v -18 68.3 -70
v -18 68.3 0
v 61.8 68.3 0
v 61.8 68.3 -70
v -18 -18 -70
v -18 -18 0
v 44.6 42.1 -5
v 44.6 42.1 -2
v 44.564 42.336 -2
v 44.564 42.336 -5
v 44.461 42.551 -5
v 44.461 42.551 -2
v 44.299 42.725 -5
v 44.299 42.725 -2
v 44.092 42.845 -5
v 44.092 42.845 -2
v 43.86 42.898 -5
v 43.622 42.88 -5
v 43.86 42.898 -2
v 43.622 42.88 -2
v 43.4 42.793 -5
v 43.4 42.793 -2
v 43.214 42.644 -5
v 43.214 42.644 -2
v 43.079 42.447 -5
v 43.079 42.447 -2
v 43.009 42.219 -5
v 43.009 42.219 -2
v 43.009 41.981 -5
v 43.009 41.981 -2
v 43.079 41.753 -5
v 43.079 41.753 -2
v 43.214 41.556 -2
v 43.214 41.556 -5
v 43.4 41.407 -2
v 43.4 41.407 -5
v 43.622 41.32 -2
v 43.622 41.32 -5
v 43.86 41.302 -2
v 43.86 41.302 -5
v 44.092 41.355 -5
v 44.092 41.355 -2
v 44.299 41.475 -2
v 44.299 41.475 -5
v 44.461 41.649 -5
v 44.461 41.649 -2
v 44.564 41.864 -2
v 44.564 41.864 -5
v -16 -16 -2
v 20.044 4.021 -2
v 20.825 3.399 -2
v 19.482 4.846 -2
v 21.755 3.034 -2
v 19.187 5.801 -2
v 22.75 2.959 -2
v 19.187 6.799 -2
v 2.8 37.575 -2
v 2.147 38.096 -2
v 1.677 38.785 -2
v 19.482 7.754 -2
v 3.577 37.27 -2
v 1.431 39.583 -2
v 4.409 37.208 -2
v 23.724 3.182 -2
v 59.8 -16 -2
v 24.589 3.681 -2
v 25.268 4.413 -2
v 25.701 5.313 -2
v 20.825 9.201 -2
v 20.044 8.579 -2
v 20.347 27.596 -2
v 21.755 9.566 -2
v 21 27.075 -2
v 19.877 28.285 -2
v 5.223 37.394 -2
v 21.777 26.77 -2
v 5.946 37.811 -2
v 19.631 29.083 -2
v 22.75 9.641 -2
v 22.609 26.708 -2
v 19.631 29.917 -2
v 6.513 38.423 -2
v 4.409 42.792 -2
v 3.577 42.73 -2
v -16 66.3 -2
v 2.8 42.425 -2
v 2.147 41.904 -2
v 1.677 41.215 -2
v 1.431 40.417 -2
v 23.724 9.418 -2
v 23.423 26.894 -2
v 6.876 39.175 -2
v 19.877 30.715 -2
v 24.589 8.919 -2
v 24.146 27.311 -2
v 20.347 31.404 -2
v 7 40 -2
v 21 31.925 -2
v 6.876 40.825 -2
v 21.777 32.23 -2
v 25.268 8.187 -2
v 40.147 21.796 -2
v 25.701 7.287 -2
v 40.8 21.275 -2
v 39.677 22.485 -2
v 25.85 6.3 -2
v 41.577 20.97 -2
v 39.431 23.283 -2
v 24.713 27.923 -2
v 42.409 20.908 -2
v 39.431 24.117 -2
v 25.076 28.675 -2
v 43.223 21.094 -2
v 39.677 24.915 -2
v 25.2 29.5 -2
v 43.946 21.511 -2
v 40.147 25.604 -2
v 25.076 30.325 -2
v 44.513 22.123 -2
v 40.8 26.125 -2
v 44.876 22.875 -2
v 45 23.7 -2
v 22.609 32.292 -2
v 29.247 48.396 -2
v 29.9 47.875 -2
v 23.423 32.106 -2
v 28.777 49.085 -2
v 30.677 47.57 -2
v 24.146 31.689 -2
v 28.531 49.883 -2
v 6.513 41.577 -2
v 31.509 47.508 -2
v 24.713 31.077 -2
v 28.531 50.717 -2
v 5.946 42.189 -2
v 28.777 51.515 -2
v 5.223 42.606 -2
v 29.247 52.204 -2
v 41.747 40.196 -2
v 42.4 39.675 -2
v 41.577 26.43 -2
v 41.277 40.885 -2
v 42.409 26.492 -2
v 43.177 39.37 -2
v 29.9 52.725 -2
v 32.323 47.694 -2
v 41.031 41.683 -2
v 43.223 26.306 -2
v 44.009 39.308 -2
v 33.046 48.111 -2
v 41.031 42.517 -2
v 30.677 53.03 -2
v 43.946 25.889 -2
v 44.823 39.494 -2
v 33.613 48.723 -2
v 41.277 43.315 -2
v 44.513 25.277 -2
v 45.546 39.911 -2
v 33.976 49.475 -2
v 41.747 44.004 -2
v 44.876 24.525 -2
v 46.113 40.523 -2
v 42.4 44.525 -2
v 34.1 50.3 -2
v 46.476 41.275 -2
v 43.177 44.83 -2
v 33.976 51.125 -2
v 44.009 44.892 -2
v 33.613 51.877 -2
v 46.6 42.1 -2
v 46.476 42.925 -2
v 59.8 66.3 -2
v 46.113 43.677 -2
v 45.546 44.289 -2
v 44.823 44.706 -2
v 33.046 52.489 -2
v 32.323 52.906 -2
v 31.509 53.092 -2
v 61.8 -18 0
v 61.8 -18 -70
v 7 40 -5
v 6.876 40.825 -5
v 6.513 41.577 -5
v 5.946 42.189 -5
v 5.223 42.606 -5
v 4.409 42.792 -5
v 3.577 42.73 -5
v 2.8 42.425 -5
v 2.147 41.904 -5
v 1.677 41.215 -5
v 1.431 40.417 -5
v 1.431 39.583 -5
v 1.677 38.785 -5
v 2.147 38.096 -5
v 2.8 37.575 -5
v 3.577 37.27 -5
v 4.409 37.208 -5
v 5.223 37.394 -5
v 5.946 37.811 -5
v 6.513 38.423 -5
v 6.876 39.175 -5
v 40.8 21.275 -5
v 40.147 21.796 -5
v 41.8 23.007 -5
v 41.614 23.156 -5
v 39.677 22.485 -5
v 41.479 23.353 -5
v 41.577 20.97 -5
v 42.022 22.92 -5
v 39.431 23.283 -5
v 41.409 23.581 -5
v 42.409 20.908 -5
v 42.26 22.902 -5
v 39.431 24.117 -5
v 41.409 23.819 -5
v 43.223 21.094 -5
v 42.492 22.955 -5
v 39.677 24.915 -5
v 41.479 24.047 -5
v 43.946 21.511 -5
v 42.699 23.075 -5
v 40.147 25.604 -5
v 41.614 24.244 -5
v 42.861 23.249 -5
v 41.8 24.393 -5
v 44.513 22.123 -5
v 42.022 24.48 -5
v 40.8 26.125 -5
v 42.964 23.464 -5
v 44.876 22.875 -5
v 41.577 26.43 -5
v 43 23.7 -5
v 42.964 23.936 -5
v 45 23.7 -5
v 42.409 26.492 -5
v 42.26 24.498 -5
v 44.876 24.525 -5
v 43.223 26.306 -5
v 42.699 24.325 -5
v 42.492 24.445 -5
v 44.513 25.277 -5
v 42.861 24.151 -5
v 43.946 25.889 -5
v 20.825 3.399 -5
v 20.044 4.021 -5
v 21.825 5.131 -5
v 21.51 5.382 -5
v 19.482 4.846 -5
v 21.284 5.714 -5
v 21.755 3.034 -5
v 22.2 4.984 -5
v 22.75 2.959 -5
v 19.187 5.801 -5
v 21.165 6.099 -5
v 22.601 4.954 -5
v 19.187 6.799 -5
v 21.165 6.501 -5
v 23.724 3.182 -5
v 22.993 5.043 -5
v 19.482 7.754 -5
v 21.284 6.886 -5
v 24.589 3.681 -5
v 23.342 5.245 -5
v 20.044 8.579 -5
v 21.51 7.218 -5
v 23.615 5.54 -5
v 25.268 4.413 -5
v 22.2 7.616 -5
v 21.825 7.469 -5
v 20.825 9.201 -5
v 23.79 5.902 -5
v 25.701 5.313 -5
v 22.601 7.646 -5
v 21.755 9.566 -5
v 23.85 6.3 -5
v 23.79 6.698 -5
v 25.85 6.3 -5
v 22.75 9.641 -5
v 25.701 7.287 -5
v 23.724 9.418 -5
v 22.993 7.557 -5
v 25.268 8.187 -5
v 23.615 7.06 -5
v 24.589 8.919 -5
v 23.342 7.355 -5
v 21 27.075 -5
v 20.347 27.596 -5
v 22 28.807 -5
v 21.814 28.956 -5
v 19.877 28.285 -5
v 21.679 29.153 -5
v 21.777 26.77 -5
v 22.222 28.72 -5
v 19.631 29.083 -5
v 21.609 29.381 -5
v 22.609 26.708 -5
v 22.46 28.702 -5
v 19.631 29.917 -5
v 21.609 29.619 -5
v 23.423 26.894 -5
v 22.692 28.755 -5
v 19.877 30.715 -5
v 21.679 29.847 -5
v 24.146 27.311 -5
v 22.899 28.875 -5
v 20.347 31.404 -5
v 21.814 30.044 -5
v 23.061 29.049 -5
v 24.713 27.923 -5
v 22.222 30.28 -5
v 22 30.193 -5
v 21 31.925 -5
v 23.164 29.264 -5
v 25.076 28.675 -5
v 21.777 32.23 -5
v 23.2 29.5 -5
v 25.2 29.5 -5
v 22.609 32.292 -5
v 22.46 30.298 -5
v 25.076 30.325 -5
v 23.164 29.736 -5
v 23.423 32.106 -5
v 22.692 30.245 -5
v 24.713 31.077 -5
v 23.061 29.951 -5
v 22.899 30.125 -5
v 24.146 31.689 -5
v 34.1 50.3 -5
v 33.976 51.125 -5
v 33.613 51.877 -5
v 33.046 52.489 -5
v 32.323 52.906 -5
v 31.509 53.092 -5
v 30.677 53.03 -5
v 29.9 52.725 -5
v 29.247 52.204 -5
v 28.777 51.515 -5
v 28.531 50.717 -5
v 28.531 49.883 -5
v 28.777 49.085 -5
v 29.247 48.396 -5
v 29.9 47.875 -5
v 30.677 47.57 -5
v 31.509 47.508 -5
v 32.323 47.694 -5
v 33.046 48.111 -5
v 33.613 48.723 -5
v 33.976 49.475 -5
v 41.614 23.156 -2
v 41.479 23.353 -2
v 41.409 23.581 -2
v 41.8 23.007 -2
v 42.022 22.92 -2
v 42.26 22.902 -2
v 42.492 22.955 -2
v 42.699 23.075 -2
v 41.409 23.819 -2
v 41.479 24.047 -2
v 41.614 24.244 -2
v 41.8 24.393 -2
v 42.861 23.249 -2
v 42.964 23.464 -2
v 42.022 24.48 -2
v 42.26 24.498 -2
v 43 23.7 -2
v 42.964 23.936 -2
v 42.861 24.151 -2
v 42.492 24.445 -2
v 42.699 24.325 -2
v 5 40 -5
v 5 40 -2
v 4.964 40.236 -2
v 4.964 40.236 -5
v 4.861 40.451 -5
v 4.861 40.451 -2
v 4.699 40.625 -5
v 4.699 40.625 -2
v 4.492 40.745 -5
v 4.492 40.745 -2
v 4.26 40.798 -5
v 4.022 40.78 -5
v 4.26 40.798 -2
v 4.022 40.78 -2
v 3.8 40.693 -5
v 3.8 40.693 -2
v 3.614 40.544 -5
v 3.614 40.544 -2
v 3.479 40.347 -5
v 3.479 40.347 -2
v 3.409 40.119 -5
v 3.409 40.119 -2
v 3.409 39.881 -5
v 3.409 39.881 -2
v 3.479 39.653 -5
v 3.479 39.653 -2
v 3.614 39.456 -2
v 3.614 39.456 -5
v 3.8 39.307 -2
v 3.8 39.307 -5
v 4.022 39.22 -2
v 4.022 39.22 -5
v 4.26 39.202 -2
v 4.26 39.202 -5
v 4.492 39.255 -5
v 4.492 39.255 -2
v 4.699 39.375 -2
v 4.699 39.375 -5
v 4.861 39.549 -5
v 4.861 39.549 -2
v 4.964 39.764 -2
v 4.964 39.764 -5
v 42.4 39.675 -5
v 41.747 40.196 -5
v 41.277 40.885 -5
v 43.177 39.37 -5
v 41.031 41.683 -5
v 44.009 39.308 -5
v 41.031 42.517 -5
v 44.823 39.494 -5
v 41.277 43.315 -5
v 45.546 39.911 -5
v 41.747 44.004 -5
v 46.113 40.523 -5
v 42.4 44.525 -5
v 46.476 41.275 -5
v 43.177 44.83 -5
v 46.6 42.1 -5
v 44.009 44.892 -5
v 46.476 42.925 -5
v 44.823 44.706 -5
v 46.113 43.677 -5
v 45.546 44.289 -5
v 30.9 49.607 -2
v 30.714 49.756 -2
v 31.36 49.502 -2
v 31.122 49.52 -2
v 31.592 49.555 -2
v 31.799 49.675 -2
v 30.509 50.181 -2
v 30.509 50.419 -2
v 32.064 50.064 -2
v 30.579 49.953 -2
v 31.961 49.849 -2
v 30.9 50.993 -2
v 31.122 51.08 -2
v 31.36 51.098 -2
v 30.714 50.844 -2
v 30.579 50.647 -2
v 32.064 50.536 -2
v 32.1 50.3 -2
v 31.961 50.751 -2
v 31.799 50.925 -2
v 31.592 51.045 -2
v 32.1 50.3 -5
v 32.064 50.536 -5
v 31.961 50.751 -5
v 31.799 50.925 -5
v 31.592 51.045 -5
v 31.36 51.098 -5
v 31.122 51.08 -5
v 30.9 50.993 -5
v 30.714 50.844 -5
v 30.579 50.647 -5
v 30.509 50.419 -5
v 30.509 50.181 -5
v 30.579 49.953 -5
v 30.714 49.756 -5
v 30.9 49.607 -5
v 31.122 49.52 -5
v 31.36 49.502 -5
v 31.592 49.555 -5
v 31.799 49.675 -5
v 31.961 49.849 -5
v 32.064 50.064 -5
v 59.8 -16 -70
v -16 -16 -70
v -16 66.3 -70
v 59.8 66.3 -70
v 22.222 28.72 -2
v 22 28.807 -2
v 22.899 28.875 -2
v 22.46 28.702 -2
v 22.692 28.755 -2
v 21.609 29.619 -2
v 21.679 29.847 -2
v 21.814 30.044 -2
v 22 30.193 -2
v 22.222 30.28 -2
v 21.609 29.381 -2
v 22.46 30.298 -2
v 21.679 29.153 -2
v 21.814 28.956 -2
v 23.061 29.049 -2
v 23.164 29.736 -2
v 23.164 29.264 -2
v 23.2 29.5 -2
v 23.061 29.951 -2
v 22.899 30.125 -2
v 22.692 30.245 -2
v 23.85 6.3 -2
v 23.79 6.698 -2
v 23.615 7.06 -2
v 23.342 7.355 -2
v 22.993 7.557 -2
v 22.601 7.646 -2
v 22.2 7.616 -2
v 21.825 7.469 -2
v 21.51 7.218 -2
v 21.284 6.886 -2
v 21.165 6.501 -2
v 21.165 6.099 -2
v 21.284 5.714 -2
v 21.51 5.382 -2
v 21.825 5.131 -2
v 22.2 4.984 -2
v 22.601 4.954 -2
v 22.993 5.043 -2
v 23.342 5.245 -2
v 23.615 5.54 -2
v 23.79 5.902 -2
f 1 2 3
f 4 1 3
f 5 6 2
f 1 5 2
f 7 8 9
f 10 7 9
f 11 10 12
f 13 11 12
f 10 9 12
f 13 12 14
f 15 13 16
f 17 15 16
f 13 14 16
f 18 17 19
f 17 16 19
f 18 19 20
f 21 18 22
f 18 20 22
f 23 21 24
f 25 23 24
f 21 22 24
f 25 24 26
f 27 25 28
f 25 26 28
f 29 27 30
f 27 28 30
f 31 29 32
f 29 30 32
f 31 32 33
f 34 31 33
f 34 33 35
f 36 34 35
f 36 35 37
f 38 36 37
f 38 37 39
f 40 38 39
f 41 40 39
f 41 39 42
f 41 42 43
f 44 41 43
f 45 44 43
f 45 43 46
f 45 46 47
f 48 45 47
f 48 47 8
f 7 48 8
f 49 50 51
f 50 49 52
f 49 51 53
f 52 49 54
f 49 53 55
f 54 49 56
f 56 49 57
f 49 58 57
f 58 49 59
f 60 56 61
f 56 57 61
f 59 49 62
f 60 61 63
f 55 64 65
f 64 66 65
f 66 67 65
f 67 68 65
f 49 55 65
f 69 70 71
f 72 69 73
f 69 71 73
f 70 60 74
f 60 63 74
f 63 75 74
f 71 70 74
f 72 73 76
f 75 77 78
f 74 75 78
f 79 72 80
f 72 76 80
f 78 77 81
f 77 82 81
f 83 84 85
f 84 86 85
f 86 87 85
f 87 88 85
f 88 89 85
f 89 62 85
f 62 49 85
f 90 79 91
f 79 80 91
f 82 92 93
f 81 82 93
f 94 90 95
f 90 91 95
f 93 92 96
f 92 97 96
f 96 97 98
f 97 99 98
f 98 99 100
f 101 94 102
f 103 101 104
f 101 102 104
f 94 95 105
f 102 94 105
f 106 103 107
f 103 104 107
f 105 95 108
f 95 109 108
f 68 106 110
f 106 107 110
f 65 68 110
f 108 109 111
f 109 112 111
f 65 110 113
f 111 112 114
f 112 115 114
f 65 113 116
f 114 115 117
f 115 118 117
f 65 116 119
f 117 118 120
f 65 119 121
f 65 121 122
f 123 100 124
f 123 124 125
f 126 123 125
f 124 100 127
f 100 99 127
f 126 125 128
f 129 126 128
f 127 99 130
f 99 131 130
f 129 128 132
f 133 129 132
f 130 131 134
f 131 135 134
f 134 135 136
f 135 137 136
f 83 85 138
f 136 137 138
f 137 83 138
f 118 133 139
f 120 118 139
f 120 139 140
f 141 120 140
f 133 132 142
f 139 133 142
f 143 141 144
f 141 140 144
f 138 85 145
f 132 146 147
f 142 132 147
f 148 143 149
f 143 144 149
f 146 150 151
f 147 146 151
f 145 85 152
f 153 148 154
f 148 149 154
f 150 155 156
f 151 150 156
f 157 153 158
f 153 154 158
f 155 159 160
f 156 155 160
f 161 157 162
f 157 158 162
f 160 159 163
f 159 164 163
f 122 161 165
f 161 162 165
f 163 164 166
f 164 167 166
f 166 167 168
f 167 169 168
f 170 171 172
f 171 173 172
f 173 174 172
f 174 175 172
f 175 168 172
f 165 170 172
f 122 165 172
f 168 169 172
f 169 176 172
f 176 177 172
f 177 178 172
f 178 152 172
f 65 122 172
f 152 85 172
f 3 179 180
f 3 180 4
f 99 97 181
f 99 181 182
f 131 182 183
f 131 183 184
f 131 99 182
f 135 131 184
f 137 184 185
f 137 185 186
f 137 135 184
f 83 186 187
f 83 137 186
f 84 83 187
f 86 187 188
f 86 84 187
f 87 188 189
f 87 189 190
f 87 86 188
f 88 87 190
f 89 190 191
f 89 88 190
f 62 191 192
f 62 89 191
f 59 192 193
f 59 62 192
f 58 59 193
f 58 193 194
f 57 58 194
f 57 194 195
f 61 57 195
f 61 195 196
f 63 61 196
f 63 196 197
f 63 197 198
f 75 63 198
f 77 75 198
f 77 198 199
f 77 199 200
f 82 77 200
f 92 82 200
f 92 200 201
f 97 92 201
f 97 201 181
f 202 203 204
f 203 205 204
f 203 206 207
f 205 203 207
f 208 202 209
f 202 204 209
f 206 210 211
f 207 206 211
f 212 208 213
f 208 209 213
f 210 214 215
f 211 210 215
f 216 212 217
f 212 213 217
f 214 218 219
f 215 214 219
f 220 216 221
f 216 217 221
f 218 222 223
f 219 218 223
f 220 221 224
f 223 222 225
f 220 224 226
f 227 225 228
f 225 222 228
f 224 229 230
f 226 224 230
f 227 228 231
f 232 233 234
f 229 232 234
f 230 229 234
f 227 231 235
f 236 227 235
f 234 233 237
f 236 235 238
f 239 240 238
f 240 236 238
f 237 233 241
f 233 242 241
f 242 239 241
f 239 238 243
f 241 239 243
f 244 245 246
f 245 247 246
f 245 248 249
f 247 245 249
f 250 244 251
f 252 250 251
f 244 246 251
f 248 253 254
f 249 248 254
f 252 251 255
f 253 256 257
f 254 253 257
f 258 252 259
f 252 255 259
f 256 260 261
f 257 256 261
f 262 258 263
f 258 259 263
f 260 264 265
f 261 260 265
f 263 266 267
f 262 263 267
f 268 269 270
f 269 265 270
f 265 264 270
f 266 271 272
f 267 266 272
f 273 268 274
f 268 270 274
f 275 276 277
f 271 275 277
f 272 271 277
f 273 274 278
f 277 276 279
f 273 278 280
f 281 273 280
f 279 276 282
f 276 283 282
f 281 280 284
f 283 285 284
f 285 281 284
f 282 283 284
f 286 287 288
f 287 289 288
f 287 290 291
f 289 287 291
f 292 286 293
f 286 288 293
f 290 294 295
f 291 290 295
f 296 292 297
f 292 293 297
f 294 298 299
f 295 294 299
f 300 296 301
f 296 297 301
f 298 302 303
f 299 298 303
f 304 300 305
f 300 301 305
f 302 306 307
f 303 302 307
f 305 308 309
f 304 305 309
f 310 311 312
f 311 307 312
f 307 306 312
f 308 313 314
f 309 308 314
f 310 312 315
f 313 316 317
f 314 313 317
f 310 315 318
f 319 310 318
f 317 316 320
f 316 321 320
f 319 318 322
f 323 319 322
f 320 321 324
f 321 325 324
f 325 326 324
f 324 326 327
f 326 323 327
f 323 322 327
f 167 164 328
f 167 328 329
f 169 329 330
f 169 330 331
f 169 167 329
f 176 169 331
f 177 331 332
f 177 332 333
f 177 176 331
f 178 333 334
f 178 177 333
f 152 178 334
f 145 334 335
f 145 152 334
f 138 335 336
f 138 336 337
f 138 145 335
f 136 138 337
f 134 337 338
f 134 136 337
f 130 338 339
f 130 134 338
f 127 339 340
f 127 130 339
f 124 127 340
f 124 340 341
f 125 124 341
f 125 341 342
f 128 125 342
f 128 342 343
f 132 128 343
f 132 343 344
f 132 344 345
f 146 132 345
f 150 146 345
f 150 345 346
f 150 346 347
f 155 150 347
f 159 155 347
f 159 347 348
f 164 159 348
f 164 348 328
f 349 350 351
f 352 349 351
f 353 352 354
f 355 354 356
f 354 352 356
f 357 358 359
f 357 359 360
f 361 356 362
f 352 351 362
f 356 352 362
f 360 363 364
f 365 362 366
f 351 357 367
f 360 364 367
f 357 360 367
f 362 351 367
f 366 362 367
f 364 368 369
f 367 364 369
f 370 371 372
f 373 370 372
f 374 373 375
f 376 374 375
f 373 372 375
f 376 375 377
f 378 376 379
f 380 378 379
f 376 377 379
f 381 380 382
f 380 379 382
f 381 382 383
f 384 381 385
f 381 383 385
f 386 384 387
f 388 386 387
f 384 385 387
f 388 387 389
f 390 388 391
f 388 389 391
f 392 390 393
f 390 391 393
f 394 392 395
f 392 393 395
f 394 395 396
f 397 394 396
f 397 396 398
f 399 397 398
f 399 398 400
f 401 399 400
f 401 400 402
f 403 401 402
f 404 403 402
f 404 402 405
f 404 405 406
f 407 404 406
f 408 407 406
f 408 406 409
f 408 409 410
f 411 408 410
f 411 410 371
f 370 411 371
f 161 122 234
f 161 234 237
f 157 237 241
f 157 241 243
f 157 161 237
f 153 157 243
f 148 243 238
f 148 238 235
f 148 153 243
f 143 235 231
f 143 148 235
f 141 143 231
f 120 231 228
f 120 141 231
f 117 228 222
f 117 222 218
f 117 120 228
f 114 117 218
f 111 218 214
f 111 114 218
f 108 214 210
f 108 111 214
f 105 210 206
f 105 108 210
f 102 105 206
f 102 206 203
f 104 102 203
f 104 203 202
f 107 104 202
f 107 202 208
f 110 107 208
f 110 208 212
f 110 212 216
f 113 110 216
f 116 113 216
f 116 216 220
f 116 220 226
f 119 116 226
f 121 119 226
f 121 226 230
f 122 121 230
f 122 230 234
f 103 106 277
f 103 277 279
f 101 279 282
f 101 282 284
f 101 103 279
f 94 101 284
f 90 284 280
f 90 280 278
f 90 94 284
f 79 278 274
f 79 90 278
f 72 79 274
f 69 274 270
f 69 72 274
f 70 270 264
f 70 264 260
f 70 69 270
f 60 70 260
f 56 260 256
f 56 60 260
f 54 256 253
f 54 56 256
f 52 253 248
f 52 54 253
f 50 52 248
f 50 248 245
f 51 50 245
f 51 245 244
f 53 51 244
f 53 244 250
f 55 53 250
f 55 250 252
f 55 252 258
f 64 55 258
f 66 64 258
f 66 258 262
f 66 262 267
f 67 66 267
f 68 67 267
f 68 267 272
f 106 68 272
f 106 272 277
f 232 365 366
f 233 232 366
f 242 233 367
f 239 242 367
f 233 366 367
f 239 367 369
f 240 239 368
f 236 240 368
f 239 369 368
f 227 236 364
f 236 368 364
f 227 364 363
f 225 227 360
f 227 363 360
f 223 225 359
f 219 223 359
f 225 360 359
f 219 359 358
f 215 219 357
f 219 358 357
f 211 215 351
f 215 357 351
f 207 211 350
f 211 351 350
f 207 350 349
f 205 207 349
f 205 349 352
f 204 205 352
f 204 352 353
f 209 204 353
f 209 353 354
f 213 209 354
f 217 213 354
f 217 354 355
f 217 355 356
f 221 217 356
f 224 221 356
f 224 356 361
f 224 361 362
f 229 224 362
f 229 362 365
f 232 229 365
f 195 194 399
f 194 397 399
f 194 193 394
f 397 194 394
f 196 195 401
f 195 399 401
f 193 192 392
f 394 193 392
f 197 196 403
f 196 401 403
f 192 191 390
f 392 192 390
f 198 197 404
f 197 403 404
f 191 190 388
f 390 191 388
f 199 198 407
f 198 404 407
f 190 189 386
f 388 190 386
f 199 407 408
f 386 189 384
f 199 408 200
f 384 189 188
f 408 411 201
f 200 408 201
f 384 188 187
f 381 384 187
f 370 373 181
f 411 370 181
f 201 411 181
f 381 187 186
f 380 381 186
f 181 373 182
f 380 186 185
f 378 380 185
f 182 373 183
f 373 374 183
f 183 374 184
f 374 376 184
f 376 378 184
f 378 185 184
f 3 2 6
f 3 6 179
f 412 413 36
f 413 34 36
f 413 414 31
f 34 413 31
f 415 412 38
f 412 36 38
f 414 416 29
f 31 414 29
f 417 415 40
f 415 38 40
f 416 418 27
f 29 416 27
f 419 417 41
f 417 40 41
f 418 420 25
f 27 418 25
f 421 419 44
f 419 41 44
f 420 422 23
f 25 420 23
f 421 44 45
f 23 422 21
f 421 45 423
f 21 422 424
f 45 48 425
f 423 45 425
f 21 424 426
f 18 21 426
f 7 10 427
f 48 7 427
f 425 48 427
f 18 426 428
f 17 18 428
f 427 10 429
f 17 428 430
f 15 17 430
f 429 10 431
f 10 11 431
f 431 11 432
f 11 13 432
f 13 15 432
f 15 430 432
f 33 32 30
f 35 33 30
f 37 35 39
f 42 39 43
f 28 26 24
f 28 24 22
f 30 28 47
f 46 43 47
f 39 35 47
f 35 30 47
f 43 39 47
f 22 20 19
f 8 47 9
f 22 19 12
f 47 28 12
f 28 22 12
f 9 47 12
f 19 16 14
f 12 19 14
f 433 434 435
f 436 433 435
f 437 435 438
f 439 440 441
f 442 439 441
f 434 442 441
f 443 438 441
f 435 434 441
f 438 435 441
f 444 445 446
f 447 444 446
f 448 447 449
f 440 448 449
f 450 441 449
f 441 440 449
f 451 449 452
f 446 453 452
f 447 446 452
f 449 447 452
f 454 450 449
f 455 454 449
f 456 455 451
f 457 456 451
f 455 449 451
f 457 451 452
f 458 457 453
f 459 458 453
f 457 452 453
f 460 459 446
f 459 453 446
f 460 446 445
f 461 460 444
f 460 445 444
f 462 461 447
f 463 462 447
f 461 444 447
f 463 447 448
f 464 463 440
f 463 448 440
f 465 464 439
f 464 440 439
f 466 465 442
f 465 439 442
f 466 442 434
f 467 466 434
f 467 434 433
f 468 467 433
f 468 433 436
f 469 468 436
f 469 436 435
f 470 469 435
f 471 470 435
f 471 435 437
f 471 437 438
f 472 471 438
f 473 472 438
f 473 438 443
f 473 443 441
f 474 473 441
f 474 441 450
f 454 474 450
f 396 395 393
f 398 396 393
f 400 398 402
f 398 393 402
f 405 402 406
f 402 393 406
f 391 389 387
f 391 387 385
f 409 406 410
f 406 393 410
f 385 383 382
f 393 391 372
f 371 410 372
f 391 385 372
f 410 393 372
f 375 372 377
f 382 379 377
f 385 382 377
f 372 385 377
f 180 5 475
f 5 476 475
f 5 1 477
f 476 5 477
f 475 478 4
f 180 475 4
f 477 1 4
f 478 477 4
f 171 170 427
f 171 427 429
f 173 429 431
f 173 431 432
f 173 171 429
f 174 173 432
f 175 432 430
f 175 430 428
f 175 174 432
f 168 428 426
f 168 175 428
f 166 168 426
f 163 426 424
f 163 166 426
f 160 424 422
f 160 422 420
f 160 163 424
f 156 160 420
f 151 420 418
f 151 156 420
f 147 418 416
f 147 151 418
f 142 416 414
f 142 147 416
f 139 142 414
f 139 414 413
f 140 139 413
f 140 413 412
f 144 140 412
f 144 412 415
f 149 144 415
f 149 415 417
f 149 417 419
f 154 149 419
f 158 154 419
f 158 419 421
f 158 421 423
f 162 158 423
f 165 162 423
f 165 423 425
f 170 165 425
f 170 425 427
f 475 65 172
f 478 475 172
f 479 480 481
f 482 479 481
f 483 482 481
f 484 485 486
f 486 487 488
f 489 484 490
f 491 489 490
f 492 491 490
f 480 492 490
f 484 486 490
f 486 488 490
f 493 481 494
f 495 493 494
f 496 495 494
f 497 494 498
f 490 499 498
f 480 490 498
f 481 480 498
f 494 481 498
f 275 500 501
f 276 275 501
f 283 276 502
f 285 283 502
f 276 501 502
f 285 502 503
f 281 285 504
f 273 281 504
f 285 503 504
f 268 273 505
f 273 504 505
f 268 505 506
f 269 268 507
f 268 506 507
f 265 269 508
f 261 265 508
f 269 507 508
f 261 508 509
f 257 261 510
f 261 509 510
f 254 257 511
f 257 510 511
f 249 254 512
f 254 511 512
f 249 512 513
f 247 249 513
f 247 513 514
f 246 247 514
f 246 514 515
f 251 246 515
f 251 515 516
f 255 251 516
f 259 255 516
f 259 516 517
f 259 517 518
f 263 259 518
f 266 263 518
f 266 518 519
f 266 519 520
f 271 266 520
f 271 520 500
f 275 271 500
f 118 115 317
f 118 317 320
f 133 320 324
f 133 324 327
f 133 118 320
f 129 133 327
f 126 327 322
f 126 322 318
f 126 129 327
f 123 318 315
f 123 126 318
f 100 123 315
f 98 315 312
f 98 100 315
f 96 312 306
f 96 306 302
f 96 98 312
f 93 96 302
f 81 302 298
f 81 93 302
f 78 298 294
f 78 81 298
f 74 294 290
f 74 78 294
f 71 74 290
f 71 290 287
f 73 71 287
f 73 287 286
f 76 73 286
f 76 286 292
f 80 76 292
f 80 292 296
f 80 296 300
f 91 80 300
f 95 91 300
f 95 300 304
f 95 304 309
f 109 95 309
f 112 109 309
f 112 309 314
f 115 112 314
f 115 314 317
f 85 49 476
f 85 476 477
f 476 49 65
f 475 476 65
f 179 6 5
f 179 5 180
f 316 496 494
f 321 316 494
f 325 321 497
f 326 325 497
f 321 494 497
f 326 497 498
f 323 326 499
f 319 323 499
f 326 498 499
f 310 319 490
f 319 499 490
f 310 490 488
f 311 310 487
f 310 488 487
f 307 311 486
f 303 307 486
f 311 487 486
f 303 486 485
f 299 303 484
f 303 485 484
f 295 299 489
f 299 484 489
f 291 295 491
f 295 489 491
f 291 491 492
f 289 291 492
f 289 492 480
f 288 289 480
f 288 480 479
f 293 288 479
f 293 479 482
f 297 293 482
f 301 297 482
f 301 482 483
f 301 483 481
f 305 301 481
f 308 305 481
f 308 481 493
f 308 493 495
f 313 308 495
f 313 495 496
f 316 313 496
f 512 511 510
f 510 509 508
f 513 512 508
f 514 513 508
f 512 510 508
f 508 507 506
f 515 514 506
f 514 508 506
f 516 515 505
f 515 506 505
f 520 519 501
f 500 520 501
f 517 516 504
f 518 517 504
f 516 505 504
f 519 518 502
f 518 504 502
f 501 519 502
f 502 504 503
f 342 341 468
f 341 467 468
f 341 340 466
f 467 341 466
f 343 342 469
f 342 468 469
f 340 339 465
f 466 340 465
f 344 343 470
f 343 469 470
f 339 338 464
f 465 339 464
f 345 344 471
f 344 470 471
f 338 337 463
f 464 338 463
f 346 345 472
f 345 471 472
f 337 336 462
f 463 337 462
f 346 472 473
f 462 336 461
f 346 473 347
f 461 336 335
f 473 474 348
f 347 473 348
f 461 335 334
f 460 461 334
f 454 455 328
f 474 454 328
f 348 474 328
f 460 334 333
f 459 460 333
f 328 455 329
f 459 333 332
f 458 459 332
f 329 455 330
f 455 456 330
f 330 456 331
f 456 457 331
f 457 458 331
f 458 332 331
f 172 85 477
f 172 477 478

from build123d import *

# Parameters (mm, degrees)
F1_W     = 79.8
F1_H     = 86.3
F1_W_2   = 75.8
F1_H_2   = 82.3
F2_DEPTH = 70
F3_DEPTH = 2
F4_R     = 3.35
F4_R_2   = 1.35
F4_R_3   = 2.8
F4_R_4   = 0.8
F5_DEPTH = 5


with BuildPart() as f2:
    # F1 (on Top) → F2 (new body)
    with BuildSketch(Plane.XY):
        with Locations((21.9, 25.15)):
            Rectangle(F1_W, F1_H)
        with Locations((21.9, 25.15)):
            Rectangle(F1_W_2, F1_H_2, mode=Mode.SUBTRACT)
    extrude(amount=-F2_DEPTH)

    # F1 (on Top) → F3 (join)
    with BuildSketch(Plane.XY):
        with Locations((21.9, 25.15)):
            Rectangle(F1_W_2, F1_H_2)
    extrude(amount=-F3_DEPTH)

    # F4 (on Top) → F5 (join)
    with BuildSketch(Plane.XY):
        with Locations((22.5, 6.3)):
            Circle(F4_R)
        with Locations((22.5, 6.3)):
            Circle(F4_R_2, mode=Mode.SUBTRACT)
        with Locations((42.2, 23.7)):
            Circle(F4_R_3)
        with Locations((42.2, 23.7)):
            Circle(F4_R_4, mode=Mode.SUBTRACT)
        with Locations((22.4, 29.5)):
            Circle(F4_R_3)
        with Locations((22.4, 29.5)):
            Circle(F4_R_4, mode=Mode.SUBTRACT)
        with Locations((4.2, 40)):
            Circle(F4_R_3)
        with Locations((4.2, 40)):
            Circle(F4_R_4, mode=Mode.SUBTRACT)
        with Locations((43.8, 42.1)):
            Circle(F4_R_3)
        with Locations((43.8, 42.1)):
            Circle(F4_R_4, mode=Mode.SUBTRACT)
        with Locations((31.3, 50.3)):
            Circle(F4_R_3)
        with Locations((31.3, 50.3)):
            Circle(F4_R_4, mode=Mode.SUBTRACT)
    extrude(amount=-F5_DEPTH)


solid = f2.part
